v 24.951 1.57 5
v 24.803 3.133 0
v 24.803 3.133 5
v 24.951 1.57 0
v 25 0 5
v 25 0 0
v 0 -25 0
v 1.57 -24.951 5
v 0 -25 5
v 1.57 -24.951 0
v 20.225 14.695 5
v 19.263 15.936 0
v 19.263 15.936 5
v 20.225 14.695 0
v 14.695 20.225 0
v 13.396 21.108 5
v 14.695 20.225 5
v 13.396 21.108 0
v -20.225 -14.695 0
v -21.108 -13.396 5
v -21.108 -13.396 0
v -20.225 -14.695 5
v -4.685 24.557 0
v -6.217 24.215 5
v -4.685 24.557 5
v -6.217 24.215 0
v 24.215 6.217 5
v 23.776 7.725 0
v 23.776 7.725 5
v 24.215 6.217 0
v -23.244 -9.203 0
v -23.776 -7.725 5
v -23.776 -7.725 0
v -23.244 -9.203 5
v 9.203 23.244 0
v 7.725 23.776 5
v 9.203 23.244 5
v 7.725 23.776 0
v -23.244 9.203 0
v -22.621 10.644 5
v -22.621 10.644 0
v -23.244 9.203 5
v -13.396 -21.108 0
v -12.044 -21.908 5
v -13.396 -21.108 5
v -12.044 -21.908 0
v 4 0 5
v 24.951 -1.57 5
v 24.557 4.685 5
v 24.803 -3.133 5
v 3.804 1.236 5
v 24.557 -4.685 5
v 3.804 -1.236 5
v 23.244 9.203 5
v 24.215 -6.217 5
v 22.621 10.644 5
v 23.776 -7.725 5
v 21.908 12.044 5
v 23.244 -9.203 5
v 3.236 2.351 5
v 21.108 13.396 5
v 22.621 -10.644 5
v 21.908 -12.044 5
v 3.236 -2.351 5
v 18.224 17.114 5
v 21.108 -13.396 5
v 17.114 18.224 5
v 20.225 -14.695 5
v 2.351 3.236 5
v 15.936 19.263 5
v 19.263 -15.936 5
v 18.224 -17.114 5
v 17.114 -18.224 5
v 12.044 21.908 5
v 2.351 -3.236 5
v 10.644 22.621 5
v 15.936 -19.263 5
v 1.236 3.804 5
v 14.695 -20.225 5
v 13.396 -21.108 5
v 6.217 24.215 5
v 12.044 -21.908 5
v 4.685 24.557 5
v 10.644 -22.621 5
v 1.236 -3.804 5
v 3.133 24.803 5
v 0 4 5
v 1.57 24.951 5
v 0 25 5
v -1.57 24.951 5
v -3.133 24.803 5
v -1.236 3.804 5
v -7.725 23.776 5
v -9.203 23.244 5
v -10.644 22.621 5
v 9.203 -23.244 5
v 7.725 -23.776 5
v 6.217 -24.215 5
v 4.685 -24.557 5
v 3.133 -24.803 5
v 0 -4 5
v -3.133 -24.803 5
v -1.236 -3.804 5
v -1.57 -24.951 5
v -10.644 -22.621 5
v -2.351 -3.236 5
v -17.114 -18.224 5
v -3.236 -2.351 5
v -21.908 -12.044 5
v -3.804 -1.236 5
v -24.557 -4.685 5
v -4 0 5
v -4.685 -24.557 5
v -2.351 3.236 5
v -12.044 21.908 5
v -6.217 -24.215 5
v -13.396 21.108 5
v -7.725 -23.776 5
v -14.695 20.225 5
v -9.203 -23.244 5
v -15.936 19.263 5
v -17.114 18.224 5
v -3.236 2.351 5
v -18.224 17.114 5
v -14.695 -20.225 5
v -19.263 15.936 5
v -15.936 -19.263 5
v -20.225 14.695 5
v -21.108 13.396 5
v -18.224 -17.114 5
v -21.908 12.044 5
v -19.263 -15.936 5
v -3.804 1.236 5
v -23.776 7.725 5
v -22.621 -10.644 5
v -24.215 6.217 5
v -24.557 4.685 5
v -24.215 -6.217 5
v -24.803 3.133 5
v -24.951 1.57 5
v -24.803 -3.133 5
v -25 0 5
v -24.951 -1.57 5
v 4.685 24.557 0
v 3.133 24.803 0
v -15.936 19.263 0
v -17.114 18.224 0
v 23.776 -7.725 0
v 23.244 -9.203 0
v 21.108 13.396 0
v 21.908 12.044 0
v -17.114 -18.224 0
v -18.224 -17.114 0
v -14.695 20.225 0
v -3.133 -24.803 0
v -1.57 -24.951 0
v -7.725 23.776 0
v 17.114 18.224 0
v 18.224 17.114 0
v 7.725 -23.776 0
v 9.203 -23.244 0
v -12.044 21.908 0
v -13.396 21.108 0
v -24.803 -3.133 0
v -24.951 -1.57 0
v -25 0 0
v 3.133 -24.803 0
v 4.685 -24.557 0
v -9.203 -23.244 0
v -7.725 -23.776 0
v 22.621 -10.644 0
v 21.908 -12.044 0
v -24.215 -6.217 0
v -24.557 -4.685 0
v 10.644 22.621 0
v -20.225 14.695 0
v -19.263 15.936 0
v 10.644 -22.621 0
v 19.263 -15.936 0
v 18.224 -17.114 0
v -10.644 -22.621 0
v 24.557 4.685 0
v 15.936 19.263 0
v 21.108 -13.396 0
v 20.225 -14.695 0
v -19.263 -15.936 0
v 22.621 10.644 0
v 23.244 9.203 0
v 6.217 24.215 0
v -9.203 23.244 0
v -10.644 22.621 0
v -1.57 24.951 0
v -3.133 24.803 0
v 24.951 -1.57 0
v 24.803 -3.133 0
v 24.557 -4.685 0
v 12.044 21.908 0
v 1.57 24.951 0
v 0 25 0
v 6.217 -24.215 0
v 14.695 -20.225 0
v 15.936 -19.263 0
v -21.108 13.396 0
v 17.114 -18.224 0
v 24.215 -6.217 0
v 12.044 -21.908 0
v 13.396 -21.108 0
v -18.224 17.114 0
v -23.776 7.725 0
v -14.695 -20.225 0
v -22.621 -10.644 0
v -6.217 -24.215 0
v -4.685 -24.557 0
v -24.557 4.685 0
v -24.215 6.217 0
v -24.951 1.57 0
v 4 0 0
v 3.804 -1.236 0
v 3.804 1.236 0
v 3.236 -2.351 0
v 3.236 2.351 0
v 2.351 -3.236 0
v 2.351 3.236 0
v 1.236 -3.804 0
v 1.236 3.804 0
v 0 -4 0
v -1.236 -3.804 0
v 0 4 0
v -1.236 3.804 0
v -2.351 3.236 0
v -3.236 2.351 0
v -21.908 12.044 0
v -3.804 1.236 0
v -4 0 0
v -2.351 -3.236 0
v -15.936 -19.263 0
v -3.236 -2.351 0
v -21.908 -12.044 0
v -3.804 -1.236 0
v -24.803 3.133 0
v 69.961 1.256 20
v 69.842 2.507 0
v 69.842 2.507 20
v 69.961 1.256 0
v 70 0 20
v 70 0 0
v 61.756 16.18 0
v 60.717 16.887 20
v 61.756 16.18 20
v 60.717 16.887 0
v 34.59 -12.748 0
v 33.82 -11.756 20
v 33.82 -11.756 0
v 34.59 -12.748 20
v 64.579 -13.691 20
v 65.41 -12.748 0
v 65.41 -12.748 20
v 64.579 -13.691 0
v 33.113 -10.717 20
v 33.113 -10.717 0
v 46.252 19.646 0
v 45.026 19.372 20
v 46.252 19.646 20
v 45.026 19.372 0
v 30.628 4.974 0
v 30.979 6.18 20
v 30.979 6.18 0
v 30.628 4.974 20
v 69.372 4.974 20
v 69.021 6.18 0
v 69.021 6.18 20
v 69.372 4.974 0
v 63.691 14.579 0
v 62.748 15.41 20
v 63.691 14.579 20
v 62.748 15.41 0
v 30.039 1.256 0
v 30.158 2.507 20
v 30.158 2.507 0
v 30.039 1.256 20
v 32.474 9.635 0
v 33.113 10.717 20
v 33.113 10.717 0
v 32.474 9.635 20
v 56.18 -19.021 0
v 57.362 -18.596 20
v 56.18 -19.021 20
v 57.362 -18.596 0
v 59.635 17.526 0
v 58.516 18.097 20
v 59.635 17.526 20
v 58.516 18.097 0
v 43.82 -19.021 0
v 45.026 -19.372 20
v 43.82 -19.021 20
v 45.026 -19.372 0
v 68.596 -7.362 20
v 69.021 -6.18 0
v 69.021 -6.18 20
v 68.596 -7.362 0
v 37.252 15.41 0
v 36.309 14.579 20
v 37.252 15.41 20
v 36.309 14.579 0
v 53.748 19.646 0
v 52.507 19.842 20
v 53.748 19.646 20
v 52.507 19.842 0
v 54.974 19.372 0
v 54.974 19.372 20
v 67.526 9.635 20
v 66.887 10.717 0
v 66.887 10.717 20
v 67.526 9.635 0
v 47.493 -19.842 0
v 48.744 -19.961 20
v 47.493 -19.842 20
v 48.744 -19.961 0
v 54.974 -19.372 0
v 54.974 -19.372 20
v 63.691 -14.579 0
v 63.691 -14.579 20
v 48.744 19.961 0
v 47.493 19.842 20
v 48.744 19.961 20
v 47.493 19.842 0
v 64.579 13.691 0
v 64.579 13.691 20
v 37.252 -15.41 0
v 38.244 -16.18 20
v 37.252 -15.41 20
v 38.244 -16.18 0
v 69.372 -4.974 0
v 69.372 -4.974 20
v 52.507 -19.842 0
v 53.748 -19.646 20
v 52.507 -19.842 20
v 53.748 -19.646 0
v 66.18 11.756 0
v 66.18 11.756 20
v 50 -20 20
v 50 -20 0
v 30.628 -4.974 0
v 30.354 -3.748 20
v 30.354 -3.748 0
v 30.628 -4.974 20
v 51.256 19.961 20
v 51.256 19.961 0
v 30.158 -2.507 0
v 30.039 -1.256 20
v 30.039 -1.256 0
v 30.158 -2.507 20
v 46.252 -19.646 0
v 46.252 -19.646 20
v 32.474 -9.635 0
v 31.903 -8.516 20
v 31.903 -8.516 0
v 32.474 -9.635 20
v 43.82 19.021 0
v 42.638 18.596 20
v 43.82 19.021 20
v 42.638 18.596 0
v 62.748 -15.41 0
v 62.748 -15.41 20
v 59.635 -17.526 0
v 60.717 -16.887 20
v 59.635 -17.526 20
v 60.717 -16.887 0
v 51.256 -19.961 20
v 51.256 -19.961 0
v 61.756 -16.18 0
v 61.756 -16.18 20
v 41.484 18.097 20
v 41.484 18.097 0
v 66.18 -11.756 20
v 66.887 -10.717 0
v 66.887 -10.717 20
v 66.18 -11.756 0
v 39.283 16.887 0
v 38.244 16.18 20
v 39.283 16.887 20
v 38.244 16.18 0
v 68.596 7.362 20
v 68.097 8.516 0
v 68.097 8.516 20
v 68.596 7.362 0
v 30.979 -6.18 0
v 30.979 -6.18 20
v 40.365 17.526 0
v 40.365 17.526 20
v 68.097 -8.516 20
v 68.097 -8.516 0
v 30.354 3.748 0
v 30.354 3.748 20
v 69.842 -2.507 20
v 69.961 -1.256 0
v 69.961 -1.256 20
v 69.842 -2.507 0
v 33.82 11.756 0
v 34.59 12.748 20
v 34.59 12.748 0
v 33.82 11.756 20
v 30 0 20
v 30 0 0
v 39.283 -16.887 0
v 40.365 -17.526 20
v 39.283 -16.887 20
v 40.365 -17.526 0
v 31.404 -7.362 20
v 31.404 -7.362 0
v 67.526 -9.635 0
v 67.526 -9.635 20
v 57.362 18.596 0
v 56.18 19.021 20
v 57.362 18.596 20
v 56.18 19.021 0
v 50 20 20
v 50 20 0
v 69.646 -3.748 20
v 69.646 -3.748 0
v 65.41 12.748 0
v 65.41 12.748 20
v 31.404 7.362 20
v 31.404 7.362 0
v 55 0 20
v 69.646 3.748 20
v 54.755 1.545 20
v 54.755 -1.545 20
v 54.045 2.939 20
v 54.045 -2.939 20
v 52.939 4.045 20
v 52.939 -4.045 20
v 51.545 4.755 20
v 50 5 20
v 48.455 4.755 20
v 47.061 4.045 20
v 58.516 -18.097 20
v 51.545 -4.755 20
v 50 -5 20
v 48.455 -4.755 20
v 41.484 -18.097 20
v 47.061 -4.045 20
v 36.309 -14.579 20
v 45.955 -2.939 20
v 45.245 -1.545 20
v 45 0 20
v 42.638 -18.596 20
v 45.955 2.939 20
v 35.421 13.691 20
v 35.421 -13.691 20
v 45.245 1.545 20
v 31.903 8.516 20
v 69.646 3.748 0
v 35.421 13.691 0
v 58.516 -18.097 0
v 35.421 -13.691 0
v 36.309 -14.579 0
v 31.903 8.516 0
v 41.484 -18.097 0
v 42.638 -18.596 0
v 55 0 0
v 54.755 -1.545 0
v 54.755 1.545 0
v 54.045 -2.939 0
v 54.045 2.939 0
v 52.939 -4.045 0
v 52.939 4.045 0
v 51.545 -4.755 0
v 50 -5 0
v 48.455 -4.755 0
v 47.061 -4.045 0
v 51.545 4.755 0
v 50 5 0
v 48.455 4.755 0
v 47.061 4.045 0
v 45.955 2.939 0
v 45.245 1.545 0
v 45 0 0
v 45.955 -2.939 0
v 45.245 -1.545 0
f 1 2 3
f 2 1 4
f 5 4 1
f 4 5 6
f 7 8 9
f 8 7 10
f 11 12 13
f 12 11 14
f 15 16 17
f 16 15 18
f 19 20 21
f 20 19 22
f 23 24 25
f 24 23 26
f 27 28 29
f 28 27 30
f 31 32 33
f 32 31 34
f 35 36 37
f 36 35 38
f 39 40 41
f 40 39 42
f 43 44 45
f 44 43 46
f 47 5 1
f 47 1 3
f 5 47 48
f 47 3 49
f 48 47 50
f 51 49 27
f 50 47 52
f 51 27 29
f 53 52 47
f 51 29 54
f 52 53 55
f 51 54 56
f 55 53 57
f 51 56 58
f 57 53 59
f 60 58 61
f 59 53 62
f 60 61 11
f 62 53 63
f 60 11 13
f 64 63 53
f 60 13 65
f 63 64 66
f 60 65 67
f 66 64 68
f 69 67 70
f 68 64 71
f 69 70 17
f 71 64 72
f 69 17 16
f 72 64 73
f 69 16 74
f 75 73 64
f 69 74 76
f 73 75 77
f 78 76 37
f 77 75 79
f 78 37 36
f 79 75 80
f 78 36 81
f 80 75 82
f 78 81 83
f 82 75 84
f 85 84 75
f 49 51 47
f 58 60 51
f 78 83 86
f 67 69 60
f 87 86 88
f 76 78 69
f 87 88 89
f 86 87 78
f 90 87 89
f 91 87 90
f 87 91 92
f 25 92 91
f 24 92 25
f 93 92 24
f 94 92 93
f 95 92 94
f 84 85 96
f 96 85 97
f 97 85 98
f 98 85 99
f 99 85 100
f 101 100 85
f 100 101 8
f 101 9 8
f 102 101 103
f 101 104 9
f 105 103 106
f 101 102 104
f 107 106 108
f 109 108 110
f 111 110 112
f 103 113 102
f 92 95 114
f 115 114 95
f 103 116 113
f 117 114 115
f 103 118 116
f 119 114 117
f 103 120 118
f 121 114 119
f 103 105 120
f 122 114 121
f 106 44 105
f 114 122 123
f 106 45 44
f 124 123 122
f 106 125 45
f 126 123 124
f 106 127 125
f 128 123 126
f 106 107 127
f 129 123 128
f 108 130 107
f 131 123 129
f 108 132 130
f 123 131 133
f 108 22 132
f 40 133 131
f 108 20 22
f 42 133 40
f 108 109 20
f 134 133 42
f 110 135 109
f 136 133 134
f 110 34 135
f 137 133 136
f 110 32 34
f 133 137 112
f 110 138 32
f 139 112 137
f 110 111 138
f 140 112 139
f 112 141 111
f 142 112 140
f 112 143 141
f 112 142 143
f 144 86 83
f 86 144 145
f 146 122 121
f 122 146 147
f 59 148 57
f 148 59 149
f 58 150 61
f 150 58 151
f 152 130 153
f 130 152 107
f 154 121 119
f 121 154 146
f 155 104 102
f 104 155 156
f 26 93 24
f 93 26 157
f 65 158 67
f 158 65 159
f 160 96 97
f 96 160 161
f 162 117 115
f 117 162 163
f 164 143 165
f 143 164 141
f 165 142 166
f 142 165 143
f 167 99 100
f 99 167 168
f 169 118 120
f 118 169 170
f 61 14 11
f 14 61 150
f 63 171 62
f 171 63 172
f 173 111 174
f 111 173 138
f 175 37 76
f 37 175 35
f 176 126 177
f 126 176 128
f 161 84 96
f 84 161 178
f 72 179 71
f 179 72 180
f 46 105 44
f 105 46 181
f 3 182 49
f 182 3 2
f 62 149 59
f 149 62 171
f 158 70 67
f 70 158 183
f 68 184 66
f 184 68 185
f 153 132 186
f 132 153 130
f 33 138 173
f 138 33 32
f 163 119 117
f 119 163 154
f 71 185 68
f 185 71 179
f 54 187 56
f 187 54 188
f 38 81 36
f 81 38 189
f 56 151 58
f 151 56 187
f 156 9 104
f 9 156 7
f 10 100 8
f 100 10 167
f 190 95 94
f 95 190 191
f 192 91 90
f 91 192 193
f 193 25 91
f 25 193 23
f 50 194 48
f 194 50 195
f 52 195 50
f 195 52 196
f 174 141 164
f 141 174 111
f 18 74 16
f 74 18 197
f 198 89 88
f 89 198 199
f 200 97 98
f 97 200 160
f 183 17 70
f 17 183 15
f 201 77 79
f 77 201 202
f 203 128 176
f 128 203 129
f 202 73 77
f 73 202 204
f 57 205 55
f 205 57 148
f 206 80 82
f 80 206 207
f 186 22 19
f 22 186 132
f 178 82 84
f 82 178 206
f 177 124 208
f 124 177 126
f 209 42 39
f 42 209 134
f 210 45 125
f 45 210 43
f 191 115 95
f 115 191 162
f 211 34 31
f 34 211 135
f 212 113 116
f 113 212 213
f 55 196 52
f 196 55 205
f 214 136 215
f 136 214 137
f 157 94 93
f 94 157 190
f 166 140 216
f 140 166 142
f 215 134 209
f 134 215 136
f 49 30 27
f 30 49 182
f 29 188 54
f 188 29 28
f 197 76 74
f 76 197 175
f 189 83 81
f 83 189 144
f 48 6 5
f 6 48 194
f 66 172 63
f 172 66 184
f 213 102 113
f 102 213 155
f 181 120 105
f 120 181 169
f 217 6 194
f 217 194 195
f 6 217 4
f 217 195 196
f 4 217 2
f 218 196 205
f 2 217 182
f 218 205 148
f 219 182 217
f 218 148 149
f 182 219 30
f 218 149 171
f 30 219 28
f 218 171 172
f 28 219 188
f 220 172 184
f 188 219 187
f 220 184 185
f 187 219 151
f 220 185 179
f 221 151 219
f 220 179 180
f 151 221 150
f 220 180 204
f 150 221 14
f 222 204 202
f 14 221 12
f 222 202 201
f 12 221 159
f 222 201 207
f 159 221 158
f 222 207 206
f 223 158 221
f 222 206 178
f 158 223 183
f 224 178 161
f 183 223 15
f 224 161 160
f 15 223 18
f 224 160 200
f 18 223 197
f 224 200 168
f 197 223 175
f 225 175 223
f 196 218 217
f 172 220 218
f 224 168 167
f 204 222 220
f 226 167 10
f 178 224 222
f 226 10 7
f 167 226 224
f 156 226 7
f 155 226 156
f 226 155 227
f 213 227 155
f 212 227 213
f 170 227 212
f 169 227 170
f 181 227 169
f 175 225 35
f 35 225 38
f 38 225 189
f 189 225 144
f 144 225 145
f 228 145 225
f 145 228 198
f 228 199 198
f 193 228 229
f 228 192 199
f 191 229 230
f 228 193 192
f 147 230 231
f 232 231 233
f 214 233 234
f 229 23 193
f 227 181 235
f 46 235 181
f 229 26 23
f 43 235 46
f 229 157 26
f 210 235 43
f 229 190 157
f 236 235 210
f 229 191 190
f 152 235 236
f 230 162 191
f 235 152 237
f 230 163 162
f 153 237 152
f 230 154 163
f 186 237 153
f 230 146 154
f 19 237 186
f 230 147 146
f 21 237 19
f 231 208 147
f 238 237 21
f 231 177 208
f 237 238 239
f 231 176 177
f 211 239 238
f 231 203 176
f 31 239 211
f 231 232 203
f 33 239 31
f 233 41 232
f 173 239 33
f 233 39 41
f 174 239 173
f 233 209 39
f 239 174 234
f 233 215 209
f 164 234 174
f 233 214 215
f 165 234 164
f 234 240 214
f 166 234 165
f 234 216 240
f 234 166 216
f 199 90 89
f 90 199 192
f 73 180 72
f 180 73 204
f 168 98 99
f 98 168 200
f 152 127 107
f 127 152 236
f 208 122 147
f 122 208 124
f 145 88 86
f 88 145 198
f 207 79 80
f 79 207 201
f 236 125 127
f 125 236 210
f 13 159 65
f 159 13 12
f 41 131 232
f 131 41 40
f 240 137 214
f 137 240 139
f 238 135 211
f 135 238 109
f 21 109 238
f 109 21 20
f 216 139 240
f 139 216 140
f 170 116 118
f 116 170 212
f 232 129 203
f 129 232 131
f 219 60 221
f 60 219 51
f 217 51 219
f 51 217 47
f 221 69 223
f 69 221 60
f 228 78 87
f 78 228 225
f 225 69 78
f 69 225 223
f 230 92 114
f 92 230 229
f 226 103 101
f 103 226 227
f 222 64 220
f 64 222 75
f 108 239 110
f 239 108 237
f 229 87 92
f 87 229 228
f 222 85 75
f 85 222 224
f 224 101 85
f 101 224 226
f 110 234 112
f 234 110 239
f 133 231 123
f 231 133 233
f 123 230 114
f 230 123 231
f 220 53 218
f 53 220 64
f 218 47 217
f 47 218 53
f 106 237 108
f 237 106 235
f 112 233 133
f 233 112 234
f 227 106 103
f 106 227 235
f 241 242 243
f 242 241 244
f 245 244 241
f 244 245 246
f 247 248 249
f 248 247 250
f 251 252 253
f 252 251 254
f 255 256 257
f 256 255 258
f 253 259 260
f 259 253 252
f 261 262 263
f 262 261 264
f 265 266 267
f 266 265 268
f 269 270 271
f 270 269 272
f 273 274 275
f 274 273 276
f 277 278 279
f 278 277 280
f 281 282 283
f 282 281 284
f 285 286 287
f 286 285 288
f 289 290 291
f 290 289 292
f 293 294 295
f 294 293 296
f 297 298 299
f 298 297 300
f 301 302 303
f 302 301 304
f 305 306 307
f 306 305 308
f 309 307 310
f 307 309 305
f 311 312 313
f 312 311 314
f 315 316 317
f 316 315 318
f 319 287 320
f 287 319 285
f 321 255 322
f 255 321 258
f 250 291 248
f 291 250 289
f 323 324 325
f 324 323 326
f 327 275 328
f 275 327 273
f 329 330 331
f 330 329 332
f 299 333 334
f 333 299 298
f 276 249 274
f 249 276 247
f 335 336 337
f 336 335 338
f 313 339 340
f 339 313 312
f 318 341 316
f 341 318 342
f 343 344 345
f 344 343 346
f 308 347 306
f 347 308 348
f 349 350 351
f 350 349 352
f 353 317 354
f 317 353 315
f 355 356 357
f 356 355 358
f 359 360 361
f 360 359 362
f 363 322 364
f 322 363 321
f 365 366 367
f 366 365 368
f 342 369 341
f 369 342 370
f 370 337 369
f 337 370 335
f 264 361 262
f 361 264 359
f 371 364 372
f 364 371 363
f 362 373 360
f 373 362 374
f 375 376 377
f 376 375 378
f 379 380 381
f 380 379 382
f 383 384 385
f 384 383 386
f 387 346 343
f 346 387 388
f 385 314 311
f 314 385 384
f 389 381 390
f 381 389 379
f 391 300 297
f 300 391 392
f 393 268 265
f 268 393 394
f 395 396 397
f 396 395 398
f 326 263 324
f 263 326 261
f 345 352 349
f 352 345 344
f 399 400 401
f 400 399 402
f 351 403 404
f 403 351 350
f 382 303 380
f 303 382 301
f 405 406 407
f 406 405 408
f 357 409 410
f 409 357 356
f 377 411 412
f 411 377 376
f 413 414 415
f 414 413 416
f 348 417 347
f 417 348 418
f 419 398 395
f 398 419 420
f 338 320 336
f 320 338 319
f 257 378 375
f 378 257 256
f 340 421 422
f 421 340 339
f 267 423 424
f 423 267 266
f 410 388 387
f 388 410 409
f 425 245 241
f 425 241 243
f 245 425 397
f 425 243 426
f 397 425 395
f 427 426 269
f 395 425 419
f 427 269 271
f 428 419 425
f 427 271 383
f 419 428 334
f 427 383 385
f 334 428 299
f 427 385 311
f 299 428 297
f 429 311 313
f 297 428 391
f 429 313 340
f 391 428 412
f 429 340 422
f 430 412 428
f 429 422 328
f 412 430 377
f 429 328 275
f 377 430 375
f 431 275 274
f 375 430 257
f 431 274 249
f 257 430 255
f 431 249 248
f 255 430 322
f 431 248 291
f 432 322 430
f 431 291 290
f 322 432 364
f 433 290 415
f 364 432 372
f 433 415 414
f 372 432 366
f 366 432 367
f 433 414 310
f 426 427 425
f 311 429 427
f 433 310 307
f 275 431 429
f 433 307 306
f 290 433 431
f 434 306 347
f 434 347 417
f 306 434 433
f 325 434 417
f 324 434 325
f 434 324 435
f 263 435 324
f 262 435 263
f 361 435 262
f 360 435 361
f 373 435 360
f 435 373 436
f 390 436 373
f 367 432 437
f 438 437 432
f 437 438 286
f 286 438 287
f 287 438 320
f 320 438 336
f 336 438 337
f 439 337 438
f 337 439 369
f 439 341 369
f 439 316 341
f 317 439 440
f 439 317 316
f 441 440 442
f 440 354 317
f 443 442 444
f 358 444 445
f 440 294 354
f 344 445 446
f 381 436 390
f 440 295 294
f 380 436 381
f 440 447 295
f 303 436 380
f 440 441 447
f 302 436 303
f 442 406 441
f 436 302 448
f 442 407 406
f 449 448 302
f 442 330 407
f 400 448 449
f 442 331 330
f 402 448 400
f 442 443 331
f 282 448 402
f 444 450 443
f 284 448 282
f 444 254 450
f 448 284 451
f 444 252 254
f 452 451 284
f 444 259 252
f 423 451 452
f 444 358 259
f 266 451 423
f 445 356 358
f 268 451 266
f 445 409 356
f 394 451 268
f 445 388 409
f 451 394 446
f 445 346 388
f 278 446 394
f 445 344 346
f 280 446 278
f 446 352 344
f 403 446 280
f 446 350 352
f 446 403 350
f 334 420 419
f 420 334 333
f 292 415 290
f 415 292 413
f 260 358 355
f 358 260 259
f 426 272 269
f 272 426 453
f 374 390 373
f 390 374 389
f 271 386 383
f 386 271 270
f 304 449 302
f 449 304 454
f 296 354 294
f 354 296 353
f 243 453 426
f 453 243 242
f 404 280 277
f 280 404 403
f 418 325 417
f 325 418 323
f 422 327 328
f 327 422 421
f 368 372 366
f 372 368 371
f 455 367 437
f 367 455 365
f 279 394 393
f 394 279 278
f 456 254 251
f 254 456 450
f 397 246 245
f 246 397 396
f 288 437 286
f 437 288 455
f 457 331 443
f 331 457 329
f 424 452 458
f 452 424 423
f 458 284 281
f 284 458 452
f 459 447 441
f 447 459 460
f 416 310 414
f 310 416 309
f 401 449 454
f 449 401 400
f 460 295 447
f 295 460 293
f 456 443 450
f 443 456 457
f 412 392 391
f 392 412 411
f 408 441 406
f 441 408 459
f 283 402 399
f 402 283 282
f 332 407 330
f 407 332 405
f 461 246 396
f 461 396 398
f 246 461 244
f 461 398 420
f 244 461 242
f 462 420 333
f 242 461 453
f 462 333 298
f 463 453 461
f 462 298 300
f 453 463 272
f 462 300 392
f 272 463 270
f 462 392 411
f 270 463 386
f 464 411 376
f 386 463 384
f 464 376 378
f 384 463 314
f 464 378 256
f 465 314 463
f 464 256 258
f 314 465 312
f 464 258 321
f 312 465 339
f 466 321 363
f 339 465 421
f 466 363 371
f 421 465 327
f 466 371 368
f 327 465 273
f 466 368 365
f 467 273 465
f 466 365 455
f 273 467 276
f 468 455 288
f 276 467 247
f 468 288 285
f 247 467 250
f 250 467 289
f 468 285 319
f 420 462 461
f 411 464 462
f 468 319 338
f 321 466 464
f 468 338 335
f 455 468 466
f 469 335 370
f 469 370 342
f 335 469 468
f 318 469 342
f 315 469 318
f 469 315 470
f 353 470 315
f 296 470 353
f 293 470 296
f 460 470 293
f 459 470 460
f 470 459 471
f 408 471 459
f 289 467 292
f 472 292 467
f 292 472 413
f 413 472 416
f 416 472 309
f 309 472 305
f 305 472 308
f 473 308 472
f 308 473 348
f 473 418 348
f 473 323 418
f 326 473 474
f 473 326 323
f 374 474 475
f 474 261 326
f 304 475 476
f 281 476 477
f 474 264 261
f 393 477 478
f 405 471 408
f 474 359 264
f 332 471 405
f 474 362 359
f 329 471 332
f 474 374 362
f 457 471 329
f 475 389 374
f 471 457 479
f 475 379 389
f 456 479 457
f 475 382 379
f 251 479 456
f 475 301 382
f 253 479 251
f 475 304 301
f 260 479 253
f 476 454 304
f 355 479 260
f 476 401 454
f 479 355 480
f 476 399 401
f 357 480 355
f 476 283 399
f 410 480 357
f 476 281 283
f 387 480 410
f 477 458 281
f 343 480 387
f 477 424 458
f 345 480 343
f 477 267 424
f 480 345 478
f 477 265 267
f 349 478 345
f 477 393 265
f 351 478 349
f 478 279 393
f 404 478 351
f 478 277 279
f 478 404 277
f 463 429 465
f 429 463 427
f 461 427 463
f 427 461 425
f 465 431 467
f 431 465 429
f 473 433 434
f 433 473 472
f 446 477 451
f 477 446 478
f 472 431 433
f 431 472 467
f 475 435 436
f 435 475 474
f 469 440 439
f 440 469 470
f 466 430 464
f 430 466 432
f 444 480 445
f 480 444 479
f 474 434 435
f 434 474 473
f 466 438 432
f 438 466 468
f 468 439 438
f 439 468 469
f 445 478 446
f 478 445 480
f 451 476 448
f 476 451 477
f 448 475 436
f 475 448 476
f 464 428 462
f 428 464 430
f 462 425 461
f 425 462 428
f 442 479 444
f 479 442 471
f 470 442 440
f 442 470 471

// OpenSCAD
module rueda_simple(grosor,diametro,diam_eje){
    //-- Construcción de la rueda a partir de los parámetros
    difference(){
        //-- Base de la rueda
        cylinder(r=diametro/2,h=grosor,$fn=100);
        //-- Taladro del eje
        cylinder(r=diam_eje/2,h=3*grosor,$fn=20,center=true);
    }
}

rueda_simple(diametro=50,grosor=5,diam_eje=8);

translate([50,0,0])
    rueda_simple(diametro=40,grosor=20,diam_eje=10);
